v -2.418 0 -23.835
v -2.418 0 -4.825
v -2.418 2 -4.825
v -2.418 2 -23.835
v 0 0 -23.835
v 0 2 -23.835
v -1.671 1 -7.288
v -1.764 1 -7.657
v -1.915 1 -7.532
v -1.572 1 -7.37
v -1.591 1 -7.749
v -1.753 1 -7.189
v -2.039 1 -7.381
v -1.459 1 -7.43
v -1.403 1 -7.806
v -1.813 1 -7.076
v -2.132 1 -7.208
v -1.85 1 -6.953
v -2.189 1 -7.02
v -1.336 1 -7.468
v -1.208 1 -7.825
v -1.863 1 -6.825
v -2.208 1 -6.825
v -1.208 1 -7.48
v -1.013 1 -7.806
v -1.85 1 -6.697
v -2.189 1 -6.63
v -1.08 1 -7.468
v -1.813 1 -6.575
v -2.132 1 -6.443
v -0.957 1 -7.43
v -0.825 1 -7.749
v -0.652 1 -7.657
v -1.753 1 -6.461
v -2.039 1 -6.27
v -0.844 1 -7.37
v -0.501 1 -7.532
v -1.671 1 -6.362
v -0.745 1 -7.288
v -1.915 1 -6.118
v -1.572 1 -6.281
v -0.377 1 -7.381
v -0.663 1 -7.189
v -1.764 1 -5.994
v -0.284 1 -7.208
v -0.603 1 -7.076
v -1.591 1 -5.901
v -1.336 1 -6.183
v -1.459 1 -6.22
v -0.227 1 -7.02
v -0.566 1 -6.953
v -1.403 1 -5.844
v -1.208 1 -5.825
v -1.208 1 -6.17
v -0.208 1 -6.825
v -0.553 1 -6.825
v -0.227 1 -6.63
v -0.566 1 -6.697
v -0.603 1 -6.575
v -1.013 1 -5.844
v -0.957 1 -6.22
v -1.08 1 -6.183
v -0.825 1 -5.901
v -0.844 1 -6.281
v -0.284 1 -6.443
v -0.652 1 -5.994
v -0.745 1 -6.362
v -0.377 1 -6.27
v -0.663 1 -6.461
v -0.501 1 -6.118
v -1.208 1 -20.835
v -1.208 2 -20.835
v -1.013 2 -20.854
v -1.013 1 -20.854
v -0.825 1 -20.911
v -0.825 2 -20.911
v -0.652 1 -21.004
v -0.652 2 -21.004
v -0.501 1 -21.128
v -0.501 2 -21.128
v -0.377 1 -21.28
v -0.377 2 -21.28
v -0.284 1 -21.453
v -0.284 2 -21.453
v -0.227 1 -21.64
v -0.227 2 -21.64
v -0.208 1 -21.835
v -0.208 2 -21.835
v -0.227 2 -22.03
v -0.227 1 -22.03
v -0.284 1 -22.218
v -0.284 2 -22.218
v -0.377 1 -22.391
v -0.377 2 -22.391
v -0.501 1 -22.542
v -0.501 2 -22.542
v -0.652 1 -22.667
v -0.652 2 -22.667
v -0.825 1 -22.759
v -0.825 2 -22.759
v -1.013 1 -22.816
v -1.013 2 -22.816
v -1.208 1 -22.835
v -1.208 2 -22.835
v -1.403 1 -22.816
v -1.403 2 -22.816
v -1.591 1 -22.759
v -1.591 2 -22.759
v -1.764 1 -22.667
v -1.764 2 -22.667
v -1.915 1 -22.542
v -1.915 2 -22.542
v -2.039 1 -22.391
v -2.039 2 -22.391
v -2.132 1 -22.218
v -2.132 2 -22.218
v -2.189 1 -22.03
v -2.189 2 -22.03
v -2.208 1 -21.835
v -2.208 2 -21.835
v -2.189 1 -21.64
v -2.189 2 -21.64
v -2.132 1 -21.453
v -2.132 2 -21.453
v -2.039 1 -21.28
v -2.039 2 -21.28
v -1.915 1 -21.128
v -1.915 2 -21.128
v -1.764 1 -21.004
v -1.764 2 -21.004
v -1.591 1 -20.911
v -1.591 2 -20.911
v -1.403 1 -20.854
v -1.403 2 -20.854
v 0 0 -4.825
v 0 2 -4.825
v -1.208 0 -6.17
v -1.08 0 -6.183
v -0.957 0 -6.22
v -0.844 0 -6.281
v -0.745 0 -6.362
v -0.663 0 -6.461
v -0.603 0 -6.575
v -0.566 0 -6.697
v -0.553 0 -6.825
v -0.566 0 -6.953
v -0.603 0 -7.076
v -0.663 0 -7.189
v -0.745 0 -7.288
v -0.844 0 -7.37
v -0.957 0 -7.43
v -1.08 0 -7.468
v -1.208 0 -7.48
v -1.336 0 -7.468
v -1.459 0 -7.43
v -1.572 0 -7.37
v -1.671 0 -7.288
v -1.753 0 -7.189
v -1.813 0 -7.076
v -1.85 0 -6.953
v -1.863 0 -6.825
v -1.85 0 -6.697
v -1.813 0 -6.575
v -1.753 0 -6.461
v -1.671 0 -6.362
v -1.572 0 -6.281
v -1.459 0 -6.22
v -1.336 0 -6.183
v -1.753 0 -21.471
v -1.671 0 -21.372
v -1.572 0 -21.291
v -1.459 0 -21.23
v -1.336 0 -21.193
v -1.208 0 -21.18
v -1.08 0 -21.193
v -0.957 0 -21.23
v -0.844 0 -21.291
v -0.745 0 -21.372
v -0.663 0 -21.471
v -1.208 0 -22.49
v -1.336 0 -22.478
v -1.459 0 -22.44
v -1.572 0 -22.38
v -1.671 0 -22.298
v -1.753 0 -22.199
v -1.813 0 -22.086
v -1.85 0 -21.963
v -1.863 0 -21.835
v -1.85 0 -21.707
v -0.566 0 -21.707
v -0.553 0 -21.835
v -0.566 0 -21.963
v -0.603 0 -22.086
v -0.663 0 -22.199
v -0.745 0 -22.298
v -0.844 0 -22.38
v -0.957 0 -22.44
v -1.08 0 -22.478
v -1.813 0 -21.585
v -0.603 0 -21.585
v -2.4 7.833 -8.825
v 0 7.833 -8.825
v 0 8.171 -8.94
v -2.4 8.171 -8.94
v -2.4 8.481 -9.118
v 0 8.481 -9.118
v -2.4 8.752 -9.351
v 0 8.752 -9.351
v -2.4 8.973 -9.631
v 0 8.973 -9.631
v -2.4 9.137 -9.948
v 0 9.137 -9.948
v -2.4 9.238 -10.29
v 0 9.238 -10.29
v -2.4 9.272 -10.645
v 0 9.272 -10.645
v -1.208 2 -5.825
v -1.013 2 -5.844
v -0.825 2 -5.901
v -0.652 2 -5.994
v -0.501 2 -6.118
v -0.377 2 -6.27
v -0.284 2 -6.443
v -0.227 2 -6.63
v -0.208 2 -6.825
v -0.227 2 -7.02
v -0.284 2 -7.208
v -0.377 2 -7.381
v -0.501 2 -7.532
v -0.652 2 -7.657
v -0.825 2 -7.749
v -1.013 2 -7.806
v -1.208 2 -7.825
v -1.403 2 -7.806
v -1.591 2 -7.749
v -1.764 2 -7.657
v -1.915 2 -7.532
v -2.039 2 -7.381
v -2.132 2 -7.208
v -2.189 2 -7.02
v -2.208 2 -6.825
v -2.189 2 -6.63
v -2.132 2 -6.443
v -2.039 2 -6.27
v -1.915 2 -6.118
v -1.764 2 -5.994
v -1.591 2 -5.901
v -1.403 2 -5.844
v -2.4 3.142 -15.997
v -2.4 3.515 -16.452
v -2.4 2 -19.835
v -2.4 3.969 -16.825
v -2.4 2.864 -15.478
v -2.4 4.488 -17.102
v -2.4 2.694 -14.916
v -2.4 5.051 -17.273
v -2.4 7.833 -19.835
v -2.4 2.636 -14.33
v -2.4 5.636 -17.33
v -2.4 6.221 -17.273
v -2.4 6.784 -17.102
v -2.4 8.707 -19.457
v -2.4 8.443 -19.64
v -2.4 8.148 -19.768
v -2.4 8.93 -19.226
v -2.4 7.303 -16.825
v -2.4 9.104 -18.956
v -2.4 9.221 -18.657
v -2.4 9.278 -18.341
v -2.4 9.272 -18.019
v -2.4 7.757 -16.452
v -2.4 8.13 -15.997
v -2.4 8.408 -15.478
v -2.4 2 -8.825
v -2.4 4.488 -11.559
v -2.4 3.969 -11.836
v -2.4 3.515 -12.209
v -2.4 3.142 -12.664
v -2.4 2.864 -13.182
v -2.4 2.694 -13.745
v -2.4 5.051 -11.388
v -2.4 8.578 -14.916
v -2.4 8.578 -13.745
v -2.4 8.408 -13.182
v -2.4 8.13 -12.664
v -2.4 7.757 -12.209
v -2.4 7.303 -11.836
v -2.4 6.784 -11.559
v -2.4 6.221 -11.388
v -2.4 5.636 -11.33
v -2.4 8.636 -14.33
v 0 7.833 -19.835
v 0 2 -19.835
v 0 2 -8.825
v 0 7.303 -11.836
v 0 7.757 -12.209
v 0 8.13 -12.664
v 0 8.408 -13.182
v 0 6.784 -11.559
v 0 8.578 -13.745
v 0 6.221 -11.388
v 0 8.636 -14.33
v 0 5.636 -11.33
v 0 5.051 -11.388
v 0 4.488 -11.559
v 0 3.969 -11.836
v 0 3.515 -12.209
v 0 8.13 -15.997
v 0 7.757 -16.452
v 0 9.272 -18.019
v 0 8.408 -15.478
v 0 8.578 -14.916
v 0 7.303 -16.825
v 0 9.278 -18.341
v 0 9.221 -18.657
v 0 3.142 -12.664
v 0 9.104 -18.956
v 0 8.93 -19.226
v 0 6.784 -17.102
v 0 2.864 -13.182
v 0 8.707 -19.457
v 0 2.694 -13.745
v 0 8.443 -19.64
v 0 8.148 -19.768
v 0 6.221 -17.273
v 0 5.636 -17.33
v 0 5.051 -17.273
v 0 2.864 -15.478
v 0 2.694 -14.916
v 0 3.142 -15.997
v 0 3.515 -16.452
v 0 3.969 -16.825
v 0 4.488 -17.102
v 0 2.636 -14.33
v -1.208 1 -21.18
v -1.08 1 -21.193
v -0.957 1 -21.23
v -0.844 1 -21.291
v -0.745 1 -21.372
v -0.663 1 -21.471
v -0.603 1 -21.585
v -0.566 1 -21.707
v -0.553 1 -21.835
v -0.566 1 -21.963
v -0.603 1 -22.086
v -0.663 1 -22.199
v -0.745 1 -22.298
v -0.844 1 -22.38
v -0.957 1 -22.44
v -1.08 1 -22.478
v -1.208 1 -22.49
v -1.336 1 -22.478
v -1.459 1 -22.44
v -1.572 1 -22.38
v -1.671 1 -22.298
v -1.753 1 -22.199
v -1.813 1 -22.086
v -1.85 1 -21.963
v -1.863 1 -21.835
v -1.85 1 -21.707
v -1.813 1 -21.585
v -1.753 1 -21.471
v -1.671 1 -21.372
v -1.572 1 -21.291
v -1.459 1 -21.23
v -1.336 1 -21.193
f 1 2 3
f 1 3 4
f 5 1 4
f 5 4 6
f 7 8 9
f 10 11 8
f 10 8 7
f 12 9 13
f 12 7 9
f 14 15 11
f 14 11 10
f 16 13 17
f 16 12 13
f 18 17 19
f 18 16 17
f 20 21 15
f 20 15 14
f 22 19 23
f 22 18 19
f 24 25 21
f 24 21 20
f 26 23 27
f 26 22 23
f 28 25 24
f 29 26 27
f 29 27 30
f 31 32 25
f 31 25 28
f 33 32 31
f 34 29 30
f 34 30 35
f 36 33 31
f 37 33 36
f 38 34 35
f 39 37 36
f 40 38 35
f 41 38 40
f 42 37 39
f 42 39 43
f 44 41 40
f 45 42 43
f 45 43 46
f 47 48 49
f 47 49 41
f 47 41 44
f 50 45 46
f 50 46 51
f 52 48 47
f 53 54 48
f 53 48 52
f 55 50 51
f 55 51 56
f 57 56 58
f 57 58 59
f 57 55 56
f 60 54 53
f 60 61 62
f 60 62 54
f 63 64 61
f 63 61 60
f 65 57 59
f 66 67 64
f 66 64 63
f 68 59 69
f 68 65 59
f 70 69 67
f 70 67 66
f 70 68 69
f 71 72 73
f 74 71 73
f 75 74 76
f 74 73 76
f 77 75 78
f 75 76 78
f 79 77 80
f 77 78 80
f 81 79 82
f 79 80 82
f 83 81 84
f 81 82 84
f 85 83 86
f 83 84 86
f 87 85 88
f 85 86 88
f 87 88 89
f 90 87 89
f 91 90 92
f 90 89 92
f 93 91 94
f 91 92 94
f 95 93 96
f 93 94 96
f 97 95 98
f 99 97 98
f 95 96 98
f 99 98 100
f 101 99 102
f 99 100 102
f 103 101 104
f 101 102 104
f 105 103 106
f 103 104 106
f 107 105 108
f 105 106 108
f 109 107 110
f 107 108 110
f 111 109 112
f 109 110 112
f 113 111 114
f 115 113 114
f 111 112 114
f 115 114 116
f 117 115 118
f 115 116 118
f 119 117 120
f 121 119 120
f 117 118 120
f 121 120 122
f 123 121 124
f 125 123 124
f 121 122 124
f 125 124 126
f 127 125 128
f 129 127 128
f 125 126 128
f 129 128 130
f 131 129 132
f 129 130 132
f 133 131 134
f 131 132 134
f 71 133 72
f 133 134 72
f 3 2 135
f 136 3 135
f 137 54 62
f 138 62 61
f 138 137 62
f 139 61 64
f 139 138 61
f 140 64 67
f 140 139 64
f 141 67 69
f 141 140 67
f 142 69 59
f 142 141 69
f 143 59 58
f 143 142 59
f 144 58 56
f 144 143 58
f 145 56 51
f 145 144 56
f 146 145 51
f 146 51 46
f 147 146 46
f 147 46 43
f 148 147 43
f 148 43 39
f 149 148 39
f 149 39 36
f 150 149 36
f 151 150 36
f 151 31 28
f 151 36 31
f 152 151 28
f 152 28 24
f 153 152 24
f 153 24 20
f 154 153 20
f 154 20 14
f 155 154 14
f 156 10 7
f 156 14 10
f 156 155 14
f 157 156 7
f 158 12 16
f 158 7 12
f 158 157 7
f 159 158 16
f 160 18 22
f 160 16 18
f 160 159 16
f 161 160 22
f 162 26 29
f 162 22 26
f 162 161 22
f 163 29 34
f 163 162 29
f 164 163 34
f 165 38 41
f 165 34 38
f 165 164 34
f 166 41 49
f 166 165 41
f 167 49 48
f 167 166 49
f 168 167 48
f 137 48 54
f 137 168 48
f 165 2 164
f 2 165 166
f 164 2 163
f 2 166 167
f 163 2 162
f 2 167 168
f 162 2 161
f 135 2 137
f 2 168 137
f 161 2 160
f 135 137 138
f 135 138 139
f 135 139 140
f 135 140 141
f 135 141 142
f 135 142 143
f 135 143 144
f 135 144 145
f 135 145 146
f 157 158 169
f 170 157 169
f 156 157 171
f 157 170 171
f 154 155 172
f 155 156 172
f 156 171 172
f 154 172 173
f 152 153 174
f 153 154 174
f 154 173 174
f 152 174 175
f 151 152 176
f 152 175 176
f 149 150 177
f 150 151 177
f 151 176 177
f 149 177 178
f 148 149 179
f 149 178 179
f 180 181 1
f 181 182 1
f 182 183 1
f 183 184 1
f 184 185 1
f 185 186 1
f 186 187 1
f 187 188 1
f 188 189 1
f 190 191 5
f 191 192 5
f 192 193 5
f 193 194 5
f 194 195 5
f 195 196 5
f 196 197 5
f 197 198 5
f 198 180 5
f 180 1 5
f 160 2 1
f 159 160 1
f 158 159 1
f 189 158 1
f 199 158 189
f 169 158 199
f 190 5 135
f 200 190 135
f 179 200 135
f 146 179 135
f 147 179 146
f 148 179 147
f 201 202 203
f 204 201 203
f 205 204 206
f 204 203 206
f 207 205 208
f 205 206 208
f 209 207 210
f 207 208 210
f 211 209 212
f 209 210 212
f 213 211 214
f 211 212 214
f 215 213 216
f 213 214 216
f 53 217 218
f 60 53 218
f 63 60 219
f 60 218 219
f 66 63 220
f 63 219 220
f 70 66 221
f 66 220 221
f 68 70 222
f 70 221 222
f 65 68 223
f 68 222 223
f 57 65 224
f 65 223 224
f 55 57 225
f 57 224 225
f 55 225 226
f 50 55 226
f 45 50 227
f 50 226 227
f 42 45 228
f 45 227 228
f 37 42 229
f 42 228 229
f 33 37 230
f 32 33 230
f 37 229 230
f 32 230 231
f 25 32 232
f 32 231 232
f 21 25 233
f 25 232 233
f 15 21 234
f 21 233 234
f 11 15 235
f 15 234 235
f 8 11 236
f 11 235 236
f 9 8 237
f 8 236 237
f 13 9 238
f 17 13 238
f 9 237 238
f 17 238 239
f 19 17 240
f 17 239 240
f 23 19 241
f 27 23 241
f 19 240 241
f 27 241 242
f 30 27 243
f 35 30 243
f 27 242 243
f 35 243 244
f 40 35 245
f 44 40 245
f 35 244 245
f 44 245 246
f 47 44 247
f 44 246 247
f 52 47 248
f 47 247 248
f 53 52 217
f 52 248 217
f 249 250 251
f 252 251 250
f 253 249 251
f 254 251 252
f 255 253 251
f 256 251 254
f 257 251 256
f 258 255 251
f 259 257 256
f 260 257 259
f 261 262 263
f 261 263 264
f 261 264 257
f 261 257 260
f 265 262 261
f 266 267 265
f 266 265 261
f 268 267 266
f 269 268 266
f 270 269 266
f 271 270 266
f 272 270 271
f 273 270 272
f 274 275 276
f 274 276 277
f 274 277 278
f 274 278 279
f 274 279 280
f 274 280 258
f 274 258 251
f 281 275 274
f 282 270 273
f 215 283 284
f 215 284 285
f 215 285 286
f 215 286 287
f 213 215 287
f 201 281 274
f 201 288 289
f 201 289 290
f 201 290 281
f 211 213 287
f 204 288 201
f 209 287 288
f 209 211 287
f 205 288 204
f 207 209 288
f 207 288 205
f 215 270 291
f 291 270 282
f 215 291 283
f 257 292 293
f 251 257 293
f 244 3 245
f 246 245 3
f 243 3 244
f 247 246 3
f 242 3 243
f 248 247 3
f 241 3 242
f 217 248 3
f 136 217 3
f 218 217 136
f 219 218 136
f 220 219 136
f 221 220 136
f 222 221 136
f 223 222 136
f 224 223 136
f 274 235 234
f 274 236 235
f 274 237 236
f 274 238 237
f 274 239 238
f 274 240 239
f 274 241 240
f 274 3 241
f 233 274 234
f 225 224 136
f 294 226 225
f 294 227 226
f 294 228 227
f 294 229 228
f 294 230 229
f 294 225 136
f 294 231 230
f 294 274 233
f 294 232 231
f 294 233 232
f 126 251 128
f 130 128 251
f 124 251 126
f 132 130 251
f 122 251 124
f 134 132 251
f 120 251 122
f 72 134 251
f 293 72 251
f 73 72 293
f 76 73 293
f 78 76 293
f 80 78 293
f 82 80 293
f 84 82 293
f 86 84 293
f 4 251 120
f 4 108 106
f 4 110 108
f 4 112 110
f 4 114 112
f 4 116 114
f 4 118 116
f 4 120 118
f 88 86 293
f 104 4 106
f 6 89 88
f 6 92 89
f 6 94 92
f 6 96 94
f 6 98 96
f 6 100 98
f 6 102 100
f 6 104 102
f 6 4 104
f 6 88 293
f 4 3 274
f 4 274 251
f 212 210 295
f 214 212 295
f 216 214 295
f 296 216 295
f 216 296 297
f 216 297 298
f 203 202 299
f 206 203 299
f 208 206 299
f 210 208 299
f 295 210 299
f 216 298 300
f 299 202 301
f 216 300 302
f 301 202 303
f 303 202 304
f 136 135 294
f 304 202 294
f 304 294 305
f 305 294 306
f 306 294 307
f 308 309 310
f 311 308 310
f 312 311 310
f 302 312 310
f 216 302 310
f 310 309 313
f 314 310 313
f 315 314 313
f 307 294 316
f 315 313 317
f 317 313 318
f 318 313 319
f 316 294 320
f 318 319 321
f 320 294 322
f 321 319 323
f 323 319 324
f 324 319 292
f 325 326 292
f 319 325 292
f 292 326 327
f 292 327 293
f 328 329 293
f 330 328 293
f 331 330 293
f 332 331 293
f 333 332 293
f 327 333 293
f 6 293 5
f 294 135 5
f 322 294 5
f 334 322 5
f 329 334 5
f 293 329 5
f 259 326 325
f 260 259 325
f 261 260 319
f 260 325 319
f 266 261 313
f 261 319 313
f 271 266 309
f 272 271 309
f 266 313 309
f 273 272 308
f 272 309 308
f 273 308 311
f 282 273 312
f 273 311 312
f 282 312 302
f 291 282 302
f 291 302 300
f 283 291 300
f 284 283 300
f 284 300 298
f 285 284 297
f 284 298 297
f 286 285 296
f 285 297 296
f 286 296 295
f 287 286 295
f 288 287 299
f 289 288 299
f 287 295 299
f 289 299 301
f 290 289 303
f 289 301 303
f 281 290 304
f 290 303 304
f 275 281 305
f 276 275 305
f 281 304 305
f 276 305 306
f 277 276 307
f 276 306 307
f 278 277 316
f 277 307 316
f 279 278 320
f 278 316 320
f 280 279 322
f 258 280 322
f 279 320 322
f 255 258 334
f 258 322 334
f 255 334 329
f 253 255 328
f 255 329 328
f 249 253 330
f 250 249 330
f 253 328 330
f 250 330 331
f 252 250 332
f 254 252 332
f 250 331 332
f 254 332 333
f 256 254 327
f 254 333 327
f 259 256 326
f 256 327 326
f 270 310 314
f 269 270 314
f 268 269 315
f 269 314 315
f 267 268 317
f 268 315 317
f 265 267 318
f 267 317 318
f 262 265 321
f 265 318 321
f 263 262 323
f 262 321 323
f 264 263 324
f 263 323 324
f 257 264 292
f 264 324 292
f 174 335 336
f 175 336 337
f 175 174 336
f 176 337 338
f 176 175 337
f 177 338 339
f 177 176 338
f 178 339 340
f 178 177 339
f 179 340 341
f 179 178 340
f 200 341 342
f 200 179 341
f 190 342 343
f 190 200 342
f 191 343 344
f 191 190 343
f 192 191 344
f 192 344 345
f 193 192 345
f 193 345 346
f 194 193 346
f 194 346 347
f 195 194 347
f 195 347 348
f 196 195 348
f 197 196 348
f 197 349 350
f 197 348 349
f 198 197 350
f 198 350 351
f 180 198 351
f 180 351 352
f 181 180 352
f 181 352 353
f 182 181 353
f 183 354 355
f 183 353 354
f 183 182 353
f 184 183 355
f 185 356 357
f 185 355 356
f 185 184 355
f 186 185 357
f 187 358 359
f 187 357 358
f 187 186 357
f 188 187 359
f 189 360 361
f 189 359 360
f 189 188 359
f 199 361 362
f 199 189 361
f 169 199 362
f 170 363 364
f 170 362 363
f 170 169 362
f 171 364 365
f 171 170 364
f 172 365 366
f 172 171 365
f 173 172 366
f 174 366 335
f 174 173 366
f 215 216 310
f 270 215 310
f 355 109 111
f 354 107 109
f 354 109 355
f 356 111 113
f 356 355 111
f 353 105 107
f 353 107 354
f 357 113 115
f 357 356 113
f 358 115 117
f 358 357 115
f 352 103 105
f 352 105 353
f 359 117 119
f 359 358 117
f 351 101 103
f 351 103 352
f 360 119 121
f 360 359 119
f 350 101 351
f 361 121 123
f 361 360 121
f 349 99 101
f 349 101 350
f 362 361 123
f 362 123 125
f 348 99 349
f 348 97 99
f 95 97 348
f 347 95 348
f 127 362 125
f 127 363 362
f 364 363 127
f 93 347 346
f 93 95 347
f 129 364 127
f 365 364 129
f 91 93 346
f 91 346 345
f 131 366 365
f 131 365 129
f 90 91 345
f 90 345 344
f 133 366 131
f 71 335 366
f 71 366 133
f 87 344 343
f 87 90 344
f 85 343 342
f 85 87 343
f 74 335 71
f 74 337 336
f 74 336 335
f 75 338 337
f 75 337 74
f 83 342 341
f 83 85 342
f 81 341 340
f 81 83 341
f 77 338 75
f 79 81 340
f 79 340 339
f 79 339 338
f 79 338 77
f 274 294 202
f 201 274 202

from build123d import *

# Parameters (mm, degrees)
SKETCH1_W           = 2.417978287
SKETCH1_H           = 19.01
SKETCH1_R           = 0.655
BOSS_EXTRUDE1_DEPTH = 2
SKETCH2_R           = 1
CUT_EXTRUDE1_DEPTH  = 1
SKETCH4_R           = 3
BOSS_EXTRUDE3_DEPTH = 2.4


with BuildPart() as part:
    # Sketch1 → Boss-Extrude1 (new body)
    with BuildSketch(Plane(origin=(0, 0, 0), x_dir=(1, 0, 0), z_dir=(0, 1, 0))):
        with Locations((-1.208989143, 14.330251099)):
            Rectangle(SKETCH1_W, SKETCH1_H)
        with Locations(Location((-1.207978287, 6.825251099, 0), (0, 0, 270))):
            Circle(SKETCH1_R, mode=Mode.SUBTRACT)
        with Locations(Location((-1.207978287, 21.835251099, 0), (0, 0, 270))):
            Circle(SKETCH1_R, mode=Mode.SUBTRACT)
    extrude(amount=BOSS_EXTRUDE1_DEPTH)

    # Sketch2 → Cut-Extrude1 (cut)
    with BuildSketch(Plane(origin=(0, 2, 0), x_dir=(1, 0, 0), z_dir=(0, 1, 0))):
        with Locations(Location((-1.207978287, 21.835251099, 0), (0, 0, 270))):
            Circle(SKETCH2_R)
        with Locations(Location((-1.207978287, 6.825251099, 0), (0, 0, 270))):
            Circle(SKETCH2_R)
    extrude(amount=-CUT_EXTRUDE1_DEPTH, mode=Mode.SUBTRACT)

    # Sketch4 → Boss-Extrude3 (add)
    with BuildSketch(Plane(origin=(0, 0, 0), x_dir=(0, 0, -1), z_dir=(1, 0, 0))):
        with BuildLine():
            Line((19.835251099, 2), (8.825251099, 2))
            Line((8.825251099, 2), (8.825251099, 7.833489784))
            ThreePointArc((8.825251099, 7.833489784), (9.485303513, 8.868997702), (10.645251099, 9.272070197))
            Line((10.645251099, 9.272070197), (18.019492282, 9.272070197))
            ThreePointArc((18.019492282, 9.272070197), (19.22631207, 8.930098925), (19.835251099, 7.833489784))
            Line((19.835251099, 7.833489784), (19.835251099, 2))
        make_face()
        with Locations((14.330251099, 5.636035099)):
            Circle(SKETCH4_R, mode=Mode.SUBTRACT)
    extrude(amount=-BOSS_EXTRUDE3_DEPTH)


solid = part.part
